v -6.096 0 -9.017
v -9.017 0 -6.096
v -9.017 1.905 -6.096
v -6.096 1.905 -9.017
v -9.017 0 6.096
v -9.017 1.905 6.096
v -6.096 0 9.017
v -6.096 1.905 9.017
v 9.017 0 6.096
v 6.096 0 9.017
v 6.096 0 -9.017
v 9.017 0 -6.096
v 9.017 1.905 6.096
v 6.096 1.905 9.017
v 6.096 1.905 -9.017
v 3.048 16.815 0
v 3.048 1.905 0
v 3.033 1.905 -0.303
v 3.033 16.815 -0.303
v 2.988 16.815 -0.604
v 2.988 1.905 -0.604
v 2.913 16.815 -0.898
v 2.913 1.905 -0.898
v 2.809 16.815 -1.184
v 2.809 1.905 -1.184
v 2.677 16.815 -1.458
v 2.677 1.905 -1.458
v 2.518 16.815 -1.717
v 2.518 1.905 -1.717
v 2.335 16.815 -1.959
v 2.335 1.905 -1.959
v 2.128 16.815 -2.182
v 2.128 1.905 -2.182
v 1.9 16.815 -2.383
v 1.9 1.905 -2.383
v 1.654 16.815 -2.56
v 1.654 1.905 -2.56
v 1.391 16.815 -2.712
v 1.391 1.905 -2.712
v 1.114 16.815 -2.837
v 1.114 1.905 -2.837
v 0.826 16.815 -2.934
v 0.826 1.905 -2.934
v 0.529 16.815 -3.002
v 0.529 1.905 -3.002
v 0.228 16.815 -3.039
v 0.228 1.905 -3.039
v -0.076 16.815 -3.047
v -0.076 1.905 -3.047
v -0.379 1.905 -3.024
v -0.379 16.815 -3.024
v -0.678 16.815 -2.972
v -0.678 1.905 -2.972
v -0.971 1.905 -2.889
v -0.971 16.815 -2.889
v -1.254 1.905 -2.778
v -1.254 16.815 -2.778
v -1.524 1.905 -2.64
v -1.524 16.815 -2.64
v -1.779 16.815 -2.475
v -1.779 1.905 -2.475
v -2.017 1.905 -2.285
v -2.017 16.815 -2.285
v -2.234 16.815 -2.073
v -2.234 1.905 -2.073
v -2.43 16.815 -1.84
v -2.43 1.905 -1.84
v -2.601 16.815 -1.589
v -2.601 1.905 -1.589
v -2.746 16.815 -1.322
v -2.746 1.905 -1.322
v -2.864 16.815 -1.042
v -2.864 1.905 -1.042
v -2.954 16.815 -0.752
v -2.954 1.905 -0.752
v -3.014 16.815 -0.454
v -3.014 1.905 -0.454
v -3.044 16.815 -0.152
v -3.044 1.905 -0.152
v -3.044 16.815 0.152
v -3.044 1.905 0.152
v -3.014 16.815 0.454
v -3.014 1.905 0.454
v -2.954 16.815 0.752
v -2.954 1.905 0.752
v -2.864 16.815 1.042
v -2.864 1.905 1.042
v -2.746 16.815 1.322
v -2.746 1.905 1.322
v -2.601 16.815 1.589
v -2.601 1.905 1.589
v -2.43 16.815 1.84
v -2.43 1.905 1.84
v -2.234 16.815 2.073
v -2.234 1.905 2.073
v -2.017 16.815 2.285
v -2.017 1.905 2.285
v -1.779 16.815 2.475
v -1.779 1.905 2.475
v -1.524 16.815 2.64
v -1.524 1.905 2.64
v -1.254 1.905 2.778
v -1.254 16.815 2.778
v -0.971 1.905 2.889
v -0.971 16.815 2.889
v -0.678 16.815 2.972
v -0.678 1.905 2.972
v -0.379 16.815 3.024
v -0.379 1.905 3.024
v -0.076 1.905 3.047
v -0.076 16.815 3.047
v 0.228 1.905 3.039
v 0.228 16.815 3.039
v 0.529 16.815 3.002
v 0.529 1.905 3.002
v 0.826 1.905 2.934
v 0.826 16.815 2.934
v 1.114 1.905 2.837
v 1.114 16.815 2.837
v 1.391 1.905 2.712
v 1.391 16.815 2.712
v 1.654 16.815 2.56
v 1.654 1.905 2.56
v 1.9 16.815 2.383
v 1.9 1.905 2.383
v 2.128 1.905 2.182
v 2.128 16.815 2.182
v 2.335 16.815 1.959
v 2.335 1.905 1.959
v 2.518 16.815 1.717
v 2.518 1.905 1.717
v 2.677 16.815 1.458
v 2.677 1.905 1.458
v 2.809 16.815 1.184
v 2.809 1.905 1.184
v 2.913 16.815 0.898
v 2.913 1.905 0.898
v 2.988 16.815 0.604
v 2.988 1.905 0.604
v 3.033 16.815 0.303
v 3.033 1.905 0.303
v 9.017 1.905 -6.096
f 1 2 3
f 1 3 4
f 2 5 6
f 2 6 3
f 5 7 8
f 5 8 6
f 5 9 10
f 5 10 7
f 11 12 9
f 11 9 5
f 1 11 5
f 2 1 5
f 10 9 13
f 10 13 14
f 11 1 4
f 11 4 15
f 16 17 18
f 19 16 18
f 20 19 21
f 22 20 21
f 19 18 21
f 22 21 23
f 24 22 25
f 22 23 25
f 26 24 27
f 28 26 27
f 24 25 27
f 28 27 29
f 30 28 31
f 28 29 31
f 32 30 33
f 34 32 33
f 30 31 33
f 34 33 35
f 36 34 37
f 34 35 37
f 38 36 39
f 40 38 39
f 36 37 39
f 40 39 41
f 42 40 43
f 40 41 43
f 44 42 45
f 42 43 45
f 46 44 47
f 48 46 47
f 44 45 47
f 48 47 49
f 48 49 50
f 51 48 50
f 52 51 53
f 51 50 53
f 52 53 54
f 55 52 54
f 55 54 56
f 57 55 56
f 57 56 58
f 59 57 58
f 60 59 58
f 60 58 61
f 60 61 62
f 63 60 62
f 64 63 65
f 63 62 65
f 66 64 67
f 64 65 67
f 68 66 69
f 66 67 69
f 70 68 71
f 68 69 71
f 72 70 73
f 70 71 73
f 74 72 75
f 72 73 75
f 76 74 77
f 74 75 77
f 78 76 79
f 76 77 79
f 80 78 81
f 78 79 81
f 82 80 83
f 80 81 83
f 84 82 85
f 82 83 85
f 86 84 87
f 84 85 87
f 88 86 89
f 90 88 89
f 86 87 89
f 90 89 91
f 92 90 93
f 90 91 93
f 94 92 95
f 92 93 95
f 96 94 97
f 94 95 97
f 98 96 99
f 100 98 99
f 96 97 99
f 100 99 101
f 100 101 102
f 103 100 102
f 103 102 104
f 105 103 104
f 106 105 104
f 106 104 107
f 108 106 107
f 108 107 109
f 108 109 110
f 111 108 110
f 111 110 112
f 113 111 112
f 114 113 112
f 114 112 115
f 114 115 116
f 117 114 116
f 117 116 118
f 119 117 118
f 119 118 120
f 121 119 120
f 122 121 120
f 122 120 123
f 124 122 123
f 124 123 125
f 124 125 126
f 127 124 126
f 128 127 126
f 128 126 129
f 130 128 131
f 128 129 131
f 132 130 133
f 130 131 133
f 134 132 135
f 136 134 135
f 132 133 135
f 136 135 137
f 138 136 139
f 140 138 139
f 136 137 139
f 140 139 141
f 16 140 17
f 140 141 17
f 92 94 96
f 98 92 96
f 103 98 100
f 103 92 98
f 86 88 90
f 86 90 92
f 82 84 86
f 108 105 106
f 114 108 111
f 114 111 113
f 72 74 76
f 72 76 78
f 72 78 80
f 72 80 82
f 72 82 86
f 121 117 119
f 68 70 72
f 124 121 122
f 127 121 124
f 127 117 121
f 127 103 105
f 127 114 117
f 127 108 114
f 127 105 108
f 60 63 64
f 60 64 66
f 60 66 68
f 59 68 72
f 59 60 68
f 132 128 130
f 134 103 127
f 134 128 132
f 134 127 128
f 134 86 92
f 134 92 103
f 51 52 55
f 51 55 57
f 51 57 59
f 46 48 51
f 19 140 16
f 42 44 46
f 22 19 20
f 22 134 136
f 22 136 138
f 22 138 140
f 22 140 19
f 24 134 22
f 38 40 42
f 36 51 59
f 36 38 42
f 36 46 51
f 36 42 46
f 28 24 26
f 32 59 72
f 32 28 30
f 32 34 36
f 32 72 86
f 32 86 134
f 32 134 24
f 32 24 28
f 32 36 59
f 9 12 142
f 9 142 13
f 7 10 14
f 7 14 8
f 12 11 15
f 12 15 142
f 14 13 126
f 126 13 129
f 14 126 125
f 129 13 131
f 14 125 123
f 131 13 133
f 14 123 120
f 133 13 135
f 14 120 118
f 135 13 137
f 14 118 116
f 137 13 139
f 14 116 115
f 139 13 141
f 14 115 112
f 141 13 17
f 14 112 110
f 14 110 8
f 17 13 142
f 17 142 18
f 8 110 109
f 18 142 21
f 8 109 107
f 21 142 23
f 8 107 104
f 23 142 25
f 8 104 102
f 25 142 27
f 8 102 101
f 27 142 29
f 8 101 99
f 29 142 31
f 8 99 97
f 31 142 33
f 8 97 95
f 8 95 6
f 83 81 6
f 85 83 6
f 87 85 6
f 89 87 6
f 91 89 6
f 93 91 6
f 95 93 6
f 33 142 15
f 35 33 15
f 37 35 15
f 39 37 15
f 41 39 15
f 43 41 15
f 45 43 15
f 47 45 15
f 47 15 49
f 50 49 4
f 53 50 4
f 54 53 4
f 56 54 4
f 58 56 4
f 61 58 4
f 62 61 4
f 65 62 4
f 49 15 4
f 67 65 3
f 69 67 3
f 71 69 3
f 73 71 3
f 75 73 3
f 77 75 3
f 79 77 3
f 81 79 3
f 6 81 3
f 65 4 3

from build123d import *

# Parameters (mm, degrees)
BOSS_EXTRUDE1_DEPTH = 1.905
SKETCH2_R           = 3.048
BOSS_EXTRUDE2_DEPTH = 14.9098


with BuildPart() as part:
    # Sketch1 → Boss-Extrude1 (new body)
    with BuildSketch(Plane(origin=(0, 0, 0), x_dir=(1, 0, 0), z_dir=(0, 1, 0))):
        Polygon((-6.096, 9.017), (6.096, 9.017), (9.017, 6.096), (9.017, -6.096), (6.096, -9.017), (-6.096, -9.017), (-9.017, -6.096), (-9.017, 6.096), align=None)
    extrude(amount=BOSS_EXTRUDE1_DEPTH)

    # Sketch2 → Boss-Extrude2 (add)
    with BuildSketch(Plane(origin=(0, 1.905, 0), x_dir=(1, 0, 0), z_dir=(0, 1, 0))):
        Circle(SKETCH2_R)
    extrude(amount=BOSS_EXTRUDE2_DEPTH)


solid = part.part
